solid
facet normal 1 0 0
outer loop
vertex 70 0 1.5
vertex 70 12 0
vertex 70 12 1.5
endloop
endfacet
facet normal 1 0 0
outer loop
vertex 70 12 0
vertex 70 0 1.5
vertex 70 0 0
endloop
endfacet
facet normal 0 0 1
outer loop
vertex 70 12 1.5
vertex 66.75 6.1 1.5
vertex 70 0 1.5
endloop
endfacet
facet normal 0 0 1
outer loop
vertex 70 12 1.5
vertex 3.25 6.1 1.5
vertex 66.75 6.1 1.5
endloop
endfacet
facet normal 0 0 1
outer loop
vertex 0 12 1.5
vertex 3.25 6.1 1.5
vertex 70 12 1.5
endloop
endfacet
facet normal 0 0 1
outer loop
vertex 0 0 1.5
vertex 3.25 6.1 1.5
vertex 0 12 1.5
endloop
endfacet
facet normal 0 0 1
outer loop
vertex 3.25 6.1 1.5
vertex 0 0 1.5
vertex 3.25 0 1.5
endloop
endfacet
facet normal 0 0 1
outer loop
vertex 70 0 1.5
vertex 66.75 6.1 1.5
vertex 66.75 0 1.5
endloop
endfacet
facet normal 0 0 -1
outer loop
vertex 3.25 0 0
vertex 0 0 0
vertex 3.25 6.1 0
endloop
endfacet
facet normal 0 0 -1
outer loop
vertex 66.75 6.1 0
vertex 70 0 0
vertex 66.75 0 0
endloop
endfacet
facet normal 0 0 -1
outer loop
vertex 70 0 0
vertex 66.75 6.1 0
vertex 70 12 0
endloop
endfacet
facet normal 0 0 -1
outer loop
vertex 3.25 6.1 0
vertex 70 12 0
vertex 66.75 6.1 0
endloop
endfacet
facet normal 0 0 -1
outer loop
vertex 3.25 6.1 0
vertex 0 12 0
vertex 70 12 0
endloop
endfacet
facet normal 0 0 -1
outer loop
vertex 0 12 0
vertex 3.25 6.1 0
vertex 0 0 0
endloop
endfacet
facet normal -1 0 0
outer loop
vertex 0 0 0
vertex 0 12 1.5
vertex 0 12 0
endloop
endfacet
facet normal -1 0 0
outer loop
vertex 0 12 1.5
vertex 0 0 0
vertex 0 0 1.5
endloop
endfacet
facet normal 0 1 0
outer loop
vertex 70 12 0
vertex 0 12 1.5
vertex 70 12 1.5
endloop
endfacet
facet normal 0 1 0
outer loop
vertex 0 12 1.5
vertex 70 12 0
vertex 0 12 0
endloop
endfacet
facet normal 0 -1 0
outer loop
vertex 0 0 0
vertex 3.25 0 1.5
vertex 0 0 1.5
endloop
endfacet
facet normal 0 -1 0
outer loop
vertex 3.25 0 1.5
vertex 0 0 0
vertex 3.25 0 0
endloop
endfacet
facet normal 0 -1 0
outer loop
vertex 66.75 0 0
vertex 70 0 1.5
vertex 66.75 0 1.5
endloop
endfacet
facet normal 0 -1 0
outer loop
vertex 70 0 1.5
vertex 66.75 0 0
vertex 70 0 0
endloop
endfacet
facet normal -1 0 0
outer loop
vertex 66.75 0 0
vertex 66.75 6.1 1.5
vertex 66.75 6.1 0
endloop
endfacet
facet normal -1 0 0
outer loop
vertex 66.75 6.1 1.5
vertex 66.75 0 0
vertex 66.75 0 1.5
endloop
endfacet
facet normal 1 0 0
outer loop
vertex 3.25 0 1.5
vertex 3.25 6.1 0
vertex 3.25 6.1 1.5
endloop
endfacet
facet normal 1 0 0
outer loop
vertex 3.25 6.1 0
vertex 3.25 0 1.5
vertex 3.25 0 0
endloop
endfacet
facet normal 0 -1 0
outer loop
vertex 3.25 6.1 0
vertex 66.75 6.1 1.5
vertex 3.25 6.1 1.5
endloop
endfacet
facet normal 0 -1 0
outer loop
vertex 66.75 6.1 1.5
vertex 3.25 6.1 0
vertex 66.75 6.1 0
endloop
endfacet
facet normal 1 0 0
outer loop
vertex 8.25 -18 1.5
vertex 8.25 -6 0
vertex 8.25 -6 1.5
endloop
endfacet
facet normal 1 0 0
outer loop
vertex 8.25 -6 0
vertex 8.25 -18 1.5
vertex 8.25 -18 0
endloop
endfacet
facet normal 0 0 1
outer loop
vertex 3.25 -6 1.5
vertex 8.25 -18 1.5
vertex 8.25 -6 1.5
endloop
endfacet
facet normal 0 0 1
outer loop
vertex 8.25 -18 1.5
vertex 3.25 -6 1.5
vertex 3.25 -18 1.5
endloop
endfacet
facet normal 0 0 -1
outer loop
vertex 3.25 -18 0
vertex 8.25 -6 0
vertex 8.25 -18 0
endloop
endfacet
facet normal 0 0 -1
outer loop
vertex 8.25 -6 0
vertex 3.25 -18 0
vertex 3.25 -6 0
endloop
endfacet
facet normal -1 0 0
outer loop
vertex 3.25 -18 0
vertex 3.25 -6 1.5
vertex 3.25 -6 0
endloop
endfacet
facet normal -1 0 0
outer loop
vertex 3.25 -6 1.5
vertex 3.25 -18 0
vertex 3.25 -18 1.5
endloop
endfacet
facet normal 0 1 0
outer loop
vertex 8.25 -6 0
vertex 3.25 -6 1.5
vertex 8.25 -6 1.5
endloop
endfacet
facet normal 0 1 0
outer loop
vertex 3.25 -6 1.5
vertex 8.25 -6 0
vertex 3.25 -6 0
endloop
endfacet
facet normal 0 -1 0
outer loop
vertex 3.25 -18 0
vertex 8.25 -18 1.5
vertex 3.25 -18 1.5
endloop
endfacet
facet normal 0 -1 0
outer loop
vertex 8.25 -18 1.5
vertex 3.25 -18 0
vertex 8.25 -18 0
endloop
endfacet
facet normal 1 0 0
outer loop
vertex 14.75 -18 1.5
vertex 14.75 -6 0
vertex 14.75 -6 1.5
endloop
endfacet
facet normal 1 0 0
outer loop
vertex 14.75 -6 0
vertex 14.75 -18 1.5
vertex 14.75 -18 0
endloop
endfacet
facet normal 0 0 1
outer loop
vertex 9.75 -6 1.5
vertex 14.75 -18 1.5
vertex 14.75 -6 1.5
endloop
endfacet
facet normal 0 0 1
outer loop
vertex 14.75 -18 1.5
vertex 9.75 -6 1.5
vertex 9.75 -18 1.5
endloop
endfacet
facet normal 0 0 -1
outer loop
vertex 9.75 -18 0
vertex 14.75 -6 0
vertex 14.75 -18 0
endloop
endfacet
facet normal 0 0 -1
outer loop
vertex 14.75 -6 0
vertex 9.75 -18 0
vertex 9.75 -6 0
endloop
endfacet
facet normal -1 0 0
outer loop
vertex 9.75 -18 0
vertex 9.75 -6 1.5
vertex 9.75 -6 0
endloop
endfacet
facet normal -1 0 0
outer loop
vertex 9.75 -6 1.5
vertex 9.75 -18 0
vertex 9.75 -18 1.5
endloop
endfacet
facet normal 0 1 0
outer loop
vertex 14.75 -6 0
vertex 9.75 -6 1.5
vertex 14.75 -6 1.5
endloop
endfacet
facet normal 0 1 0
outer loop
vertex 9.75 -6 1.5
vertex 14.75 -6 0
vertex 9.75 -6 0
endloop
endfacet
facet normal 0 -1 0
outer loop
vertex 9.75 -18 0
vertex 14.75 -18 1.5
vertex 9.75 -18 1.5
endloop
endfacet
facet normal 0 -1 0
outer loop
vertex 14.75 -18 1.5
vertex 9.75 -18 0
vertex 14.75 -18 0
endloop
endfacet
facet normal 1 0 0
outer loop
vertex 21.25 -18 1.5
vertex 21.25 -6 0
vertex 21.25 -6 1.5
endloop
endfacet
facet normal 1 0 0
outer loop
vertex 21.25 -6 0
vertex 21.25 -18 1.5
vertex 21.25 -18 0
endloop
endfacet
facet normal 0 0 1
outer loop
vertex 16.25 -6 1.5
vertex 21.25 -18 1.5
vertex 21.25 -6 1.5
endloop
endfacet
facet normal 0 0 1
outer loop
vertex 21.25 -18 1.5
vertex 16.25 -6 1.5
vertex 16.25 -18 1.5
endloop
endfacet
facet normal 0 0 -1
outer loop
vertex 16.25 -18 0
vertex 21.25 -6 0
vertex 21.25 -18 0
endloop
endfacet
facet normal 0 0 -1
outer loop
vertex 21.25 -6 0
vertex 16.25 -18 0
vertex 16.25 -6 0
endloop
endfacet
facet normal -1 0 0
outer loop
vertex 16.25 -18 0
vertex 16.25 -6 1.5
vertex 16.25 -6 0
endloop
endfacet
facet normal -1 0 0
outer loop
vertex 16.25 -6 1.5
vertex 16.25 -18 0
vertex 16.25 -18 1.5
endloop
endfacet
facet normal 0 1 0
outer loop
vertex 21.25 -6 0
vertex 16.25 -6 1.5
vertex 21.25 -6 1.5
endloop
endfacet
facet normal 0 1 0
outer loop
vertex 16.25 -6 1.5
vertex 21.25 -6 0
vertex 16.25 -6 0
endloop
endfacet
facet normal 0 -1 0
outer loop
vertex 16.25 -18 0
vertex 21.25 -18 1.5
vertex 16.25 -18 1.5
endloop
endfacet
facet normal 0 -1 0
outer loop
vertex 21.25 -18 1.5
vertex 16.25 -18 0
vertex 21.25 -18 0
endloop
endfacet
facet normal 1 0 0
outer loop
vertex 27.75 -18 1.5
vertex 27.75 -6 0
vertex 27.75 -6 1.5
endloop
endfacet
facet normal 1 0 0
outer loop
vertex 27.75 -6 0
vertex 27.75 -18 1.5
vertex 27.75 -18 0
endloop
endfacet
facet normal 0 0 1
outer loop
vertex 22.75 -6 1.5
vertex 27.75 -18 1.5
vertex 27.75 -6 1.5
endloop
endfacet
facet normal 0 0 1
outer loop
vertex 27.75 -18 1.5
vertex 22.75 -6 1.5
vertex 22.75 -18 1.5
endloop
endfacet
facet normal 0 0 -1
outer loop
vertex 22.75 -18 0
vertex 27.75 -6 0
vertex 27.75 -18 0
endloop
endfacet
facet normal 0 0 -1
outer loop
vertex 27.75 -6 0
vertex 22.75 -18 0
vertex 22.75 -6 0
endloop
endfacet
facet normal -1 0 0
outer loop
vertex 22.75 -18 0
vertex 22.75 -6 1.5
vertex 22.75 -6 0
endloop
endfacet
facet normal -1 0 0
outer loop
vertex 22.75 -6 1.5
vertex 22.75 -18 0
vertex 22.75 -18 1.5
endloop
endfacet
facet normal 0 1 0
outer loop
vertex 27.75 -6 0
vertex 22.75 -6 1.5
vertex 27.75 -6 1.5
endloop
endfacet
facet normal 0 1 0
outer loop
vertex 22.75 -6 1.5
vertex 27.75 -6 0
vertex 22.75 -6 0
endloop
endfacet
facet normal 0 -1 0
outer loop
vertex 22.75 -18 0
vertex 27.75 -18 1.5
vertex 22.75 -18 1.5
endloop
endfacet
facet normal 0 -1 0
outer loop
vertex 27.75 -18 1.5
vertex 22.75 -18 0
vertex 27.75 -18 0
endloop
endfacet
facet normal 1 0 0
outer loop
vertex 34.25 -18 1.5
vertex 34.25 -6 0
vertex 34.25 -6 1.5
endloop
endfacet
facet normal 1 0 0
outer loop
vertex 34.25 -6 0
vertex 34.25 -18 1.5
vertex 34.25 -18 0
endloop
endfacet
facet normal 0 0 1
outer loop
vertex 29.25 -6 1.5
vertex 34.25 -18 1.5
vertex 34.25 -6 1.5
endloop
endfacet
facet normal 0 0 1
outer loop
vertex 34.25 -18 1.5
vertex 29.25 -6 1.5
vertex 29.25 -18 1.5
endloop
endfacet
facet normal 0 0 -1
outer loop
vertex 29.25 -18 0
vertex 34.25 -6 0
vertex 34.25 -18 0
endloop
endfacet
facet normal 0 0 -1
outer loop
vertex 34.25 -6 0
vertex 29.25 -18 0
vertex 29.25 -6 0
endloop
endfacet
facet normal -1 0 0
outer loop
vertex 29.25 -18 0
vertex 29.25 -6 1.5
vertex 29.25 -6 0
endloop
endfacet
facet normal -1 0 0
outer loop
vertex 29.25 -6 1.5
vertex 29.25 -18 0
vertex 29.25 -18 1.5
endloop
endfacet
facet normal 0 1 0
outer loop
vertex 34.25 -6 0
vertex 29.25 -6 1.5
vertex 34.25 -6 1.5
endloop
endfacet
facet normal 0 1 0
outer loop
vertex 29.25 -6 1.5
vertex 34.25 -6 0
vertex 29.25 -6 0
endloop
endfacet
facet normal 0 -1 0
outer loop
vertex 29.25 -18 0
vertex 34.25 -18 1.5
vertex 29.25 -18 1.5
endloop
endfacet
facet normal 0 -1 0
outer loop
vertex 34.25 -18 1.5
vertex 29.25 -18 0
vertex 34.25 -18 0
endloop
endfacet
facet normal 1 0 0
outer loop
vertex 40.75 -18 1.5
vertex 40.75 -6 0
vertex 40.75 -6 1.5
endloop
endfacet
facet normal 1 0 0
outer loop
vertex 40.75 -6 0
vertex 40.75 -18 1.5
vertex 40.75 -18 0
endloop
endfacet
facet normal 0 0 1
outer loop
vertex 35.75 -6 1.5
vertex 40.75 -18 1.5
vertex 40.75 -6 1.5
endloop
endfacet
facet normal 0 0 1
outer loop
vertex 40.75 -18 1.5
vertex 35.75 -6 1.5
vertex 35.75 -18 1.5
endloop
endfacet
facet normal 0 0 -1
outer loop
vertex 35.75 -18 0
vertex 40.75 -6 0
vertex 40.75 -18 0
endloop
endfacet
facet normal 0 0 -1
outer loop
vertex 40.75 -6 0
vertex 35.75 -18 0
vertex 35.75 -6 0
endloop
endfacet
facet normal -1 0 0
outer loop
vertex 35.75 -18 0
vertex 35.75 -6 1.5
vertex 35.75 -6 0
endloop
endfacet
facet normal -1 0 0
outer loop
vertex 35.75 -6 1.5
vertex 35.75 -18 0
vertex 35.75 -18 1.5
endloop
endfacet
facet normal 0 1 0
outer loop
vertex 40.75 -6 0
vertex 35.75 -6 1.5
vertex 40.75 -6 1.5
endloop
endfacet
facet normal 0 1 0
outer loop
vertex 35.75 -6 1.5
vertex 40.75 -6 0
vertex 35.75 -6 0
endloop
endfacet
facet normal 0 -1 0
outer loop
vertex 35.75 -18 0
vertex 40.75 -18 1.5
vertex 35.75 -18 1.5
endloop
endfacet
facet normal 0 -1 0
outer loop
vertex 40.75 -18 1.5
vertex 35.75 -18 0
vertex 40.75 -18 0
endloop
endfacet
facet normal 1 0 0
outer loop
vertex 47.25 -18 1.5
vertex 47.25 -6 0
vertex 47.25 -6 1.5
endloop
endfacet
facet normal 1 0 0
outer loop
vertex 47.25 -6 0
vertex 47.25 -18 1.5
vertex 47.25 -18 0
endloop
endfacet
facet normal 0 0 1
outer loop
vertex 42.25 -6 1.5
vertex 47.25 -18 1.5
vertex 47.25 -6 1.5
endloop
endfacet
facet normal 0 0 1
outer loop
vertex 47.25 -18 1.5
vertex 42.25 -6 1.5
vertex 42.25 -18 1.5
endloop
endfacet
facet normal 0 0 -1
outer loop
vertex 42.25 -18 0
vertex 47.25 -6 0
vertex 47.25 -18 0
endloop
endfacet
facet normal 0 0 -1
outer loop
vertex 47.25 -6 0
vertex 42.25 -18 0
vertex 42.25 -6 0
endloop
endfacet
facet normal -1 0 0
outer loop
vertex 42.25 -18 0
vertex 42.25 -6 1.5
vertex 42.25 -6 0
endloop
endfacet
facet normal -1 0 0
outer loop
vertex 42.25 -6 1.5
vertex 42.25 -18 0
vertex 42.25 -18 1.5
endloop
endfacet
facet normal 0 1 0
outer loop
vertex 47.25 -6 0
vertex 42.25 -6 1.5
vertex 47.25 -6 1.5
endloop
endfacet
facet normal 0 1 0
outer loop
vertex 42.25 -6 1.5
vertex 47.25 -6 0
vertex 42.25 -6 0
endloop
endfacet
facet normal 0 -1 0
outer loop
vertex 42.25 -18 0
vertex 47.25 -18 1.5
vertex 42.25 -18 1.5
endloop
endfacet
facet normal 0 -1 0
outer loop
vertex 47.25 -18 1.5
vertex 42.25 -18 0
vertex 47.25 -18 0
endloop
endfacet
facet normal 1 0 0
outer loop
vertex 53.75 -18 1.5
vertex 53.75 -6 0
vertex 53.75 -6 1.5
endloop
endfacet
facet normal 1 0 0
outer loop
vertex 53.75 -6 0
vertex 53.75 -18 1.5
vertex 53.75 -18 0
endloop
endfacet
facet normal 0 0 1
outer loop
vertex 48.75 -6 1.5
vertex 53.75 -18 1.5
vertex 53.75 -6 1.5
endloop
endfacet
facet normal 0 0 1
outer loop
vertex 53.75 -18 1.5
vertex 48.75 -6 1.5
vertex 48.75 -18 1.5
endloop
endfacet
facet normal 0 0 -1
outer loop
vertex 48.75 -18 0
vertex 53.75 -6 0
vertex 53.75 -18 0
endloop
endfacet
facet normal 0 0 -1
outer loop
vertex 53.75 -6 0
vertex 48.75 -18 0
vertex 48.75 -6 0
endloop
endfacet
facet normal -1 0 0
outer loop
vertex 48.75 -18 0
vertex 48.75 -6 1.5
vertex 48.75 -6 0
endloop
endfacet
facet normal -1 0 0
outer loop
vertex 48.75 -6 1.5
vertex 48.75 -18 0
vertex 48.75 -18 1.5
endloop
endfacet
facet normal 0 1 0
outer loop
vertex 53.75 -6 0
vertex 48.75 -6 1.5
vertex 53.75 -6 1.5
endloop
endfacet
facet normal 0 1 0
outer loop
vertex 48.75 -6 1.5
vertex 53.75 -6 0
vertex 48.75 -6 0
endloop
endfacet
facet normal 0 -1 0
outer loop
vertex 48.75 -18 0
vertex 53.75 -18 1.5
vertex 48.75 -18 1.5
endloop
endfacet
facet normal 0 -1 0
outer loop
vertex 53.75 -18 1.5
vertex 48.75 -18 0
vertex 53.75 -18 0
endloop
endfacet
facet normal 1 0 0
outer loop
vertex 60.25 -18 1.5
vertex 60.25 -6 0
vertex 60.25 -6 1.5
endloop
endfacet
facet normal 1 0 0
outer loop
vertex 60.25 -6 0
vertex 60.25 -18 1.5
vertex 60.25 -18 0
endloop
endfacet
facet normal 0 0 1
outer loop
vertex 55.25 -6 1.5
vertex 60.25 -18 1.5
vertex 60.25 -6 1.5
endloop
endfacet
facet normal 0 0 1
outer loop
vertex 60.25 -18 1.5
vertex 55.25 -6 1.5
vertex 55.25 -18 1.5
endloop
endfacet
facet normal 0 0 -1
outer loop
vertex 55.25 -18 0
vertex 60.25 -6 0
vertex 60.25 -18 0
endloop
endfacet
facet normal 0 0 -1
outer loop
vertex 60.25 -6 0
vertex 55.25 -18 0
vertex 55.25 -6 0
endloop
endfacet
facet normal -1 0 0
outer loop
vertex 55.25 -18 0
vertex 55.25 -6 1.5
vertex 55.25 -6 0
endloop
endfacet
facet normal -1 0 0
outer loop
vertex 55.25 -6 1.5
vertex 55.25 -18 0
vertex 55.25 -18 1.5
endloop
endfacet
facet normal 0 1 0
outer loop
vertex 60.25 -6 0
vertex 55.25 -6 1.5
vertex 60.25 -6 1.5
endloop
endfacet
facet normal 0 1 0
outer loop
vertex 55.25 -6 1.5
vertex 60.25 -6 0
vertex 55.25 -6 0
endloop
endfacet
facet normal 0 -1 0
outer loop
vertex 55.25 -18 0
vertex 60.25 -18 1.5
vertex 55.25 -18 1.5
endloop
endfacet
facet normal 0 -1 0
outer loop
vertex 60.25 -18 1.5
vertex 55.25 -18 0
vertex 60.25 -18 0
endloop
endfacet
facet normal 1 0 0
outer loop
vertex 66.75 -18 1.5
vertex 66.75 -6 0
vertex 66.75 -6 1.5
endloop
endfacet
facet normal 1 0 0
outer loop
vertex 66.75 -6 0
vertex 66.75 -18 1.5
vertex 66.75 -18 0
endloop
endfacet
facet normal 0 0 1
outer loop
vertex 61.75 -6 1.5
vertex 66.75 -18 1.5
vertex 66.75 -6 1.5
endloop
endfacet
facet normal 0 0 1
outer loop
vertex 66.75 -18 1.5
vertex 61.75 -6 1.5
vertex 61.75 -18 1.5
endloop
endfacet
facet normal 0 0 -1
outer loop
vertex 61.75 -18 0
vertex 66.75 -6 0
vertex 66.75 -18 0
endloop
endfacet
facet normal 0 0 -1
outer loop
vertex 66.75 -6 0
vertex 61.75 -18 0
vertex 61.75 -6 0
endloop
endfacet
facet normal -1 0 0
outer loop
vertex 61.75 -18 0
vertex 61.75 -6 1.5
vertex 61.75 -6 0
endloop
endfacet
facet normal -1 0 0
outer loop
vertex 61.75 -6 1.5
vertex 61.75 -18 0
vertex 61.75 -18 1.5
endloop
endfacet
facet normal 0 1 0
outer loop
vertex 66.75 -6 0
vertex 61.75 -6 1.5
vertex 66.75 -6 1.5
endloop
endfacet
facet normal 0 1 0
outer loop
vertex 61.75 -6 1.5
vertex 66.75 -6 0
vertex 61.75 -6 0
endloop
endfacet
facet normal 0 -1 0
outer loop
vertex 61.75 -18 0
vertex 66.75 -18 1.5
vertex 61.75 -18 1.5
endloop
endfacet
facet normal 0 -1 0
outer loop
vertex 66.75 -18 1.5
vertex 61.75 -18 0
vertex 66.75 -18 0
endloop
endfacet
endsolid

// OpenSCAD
// 10-well Agarose Gel Casting Comb
// Designed for FDM printing, lying flat on the XY plane (Z=0).

// --- Dimensions ---
$fn = 64; // Smoothness for curved features

// Spine dimensions
SPINE_LENGTH = 70;   // mm (X)
SPINE_WIDTH = 12;    // mm (Y)
PLATE_THICKNESS = 1.5; // mm (Z)

// Tooth dimensions
NUM_TEETH = 10;
TOOTH_WIDTH = 5.0;   // mm (X)
TOOTH_LENGTH = 12;   // mm (Y) (extends from spine edge)
GAP_SIZE = 1.5;      // mm (X) between teeth

// --- Calculations ---
// Total width of the tooth row
TOOTH_ROW_WIDTH = (NUM_TEETH * TOOTH_WIDTH) + ((NUM_TEETH - 1) * GAP_SIZE);

// Offset to center the tooth row on the spine in X
X_OFFSET = (SPINE_LENGTH - TOOTH_ROW_WIDTH) / 2;

// Position of the spine edge where teeth hang (in Y)
// Spine goes from -SPINE_WIDTH/2 to +SPINE_WIDTH/2.
// Teeth hang in -Y direction, so they start at -SPINE_WIDTH/2 and extend to -SPINE_WIDTH/2 - TOOTH_LENGTH.
SPINE_Y_START = -SPINE_WIDTH / 2;
TEETH_Y_START = SPINE_Y_START - TOOTH_LENGTH;

// --- Main Body (Spine) ---
// A flat plate 70x12x1.5
difference() {
    // Outer block
    cube([SPINE_LENGTH, SPINE_WIDTH, PLATE_THICKNESS], center = false);
    
    // Cut out the area where teeth will hang to ensure clean separation
    // We cut a rectangle slightly larger than the tooth row to avoid coplanar faces
    translate([X_OFFSET, SPINE_Y_START, 0]) {
        cube([TOOTH_ROW_WIDTH, TOOTH_LENGTH + 0.1, PLATE_THICKNESS + 0.1], center = false);
    }
}

// --- Teeth ---
// We iterate through each tooth position
for (i = [0 : NUM_TEETH - 1]) {
    // Calculate X position for this tooth
    // Start at X_OFFSET, add tooth width and gaps
    current_x = X_OFFSET + (i * (TOOTH_WIDTH + GAP_SIZE));
    
    // Translate to position
    translate([current_x, TEETH_Y_START, 0]) {
        // Tooth geometry: 5.0 wide (X) x 12 long (Y) x 1.5 thick (Z)
        // The tooth hangs down from the spine edge.
        // With TEETH_Y_START = -18, and cube growing positive Y, it occupies Y from -18 to -6.
        cube([TOOTH_WIDTH, TOOTH_LENGTH, PLATE_THICKNESS], center = false);
    }
}
